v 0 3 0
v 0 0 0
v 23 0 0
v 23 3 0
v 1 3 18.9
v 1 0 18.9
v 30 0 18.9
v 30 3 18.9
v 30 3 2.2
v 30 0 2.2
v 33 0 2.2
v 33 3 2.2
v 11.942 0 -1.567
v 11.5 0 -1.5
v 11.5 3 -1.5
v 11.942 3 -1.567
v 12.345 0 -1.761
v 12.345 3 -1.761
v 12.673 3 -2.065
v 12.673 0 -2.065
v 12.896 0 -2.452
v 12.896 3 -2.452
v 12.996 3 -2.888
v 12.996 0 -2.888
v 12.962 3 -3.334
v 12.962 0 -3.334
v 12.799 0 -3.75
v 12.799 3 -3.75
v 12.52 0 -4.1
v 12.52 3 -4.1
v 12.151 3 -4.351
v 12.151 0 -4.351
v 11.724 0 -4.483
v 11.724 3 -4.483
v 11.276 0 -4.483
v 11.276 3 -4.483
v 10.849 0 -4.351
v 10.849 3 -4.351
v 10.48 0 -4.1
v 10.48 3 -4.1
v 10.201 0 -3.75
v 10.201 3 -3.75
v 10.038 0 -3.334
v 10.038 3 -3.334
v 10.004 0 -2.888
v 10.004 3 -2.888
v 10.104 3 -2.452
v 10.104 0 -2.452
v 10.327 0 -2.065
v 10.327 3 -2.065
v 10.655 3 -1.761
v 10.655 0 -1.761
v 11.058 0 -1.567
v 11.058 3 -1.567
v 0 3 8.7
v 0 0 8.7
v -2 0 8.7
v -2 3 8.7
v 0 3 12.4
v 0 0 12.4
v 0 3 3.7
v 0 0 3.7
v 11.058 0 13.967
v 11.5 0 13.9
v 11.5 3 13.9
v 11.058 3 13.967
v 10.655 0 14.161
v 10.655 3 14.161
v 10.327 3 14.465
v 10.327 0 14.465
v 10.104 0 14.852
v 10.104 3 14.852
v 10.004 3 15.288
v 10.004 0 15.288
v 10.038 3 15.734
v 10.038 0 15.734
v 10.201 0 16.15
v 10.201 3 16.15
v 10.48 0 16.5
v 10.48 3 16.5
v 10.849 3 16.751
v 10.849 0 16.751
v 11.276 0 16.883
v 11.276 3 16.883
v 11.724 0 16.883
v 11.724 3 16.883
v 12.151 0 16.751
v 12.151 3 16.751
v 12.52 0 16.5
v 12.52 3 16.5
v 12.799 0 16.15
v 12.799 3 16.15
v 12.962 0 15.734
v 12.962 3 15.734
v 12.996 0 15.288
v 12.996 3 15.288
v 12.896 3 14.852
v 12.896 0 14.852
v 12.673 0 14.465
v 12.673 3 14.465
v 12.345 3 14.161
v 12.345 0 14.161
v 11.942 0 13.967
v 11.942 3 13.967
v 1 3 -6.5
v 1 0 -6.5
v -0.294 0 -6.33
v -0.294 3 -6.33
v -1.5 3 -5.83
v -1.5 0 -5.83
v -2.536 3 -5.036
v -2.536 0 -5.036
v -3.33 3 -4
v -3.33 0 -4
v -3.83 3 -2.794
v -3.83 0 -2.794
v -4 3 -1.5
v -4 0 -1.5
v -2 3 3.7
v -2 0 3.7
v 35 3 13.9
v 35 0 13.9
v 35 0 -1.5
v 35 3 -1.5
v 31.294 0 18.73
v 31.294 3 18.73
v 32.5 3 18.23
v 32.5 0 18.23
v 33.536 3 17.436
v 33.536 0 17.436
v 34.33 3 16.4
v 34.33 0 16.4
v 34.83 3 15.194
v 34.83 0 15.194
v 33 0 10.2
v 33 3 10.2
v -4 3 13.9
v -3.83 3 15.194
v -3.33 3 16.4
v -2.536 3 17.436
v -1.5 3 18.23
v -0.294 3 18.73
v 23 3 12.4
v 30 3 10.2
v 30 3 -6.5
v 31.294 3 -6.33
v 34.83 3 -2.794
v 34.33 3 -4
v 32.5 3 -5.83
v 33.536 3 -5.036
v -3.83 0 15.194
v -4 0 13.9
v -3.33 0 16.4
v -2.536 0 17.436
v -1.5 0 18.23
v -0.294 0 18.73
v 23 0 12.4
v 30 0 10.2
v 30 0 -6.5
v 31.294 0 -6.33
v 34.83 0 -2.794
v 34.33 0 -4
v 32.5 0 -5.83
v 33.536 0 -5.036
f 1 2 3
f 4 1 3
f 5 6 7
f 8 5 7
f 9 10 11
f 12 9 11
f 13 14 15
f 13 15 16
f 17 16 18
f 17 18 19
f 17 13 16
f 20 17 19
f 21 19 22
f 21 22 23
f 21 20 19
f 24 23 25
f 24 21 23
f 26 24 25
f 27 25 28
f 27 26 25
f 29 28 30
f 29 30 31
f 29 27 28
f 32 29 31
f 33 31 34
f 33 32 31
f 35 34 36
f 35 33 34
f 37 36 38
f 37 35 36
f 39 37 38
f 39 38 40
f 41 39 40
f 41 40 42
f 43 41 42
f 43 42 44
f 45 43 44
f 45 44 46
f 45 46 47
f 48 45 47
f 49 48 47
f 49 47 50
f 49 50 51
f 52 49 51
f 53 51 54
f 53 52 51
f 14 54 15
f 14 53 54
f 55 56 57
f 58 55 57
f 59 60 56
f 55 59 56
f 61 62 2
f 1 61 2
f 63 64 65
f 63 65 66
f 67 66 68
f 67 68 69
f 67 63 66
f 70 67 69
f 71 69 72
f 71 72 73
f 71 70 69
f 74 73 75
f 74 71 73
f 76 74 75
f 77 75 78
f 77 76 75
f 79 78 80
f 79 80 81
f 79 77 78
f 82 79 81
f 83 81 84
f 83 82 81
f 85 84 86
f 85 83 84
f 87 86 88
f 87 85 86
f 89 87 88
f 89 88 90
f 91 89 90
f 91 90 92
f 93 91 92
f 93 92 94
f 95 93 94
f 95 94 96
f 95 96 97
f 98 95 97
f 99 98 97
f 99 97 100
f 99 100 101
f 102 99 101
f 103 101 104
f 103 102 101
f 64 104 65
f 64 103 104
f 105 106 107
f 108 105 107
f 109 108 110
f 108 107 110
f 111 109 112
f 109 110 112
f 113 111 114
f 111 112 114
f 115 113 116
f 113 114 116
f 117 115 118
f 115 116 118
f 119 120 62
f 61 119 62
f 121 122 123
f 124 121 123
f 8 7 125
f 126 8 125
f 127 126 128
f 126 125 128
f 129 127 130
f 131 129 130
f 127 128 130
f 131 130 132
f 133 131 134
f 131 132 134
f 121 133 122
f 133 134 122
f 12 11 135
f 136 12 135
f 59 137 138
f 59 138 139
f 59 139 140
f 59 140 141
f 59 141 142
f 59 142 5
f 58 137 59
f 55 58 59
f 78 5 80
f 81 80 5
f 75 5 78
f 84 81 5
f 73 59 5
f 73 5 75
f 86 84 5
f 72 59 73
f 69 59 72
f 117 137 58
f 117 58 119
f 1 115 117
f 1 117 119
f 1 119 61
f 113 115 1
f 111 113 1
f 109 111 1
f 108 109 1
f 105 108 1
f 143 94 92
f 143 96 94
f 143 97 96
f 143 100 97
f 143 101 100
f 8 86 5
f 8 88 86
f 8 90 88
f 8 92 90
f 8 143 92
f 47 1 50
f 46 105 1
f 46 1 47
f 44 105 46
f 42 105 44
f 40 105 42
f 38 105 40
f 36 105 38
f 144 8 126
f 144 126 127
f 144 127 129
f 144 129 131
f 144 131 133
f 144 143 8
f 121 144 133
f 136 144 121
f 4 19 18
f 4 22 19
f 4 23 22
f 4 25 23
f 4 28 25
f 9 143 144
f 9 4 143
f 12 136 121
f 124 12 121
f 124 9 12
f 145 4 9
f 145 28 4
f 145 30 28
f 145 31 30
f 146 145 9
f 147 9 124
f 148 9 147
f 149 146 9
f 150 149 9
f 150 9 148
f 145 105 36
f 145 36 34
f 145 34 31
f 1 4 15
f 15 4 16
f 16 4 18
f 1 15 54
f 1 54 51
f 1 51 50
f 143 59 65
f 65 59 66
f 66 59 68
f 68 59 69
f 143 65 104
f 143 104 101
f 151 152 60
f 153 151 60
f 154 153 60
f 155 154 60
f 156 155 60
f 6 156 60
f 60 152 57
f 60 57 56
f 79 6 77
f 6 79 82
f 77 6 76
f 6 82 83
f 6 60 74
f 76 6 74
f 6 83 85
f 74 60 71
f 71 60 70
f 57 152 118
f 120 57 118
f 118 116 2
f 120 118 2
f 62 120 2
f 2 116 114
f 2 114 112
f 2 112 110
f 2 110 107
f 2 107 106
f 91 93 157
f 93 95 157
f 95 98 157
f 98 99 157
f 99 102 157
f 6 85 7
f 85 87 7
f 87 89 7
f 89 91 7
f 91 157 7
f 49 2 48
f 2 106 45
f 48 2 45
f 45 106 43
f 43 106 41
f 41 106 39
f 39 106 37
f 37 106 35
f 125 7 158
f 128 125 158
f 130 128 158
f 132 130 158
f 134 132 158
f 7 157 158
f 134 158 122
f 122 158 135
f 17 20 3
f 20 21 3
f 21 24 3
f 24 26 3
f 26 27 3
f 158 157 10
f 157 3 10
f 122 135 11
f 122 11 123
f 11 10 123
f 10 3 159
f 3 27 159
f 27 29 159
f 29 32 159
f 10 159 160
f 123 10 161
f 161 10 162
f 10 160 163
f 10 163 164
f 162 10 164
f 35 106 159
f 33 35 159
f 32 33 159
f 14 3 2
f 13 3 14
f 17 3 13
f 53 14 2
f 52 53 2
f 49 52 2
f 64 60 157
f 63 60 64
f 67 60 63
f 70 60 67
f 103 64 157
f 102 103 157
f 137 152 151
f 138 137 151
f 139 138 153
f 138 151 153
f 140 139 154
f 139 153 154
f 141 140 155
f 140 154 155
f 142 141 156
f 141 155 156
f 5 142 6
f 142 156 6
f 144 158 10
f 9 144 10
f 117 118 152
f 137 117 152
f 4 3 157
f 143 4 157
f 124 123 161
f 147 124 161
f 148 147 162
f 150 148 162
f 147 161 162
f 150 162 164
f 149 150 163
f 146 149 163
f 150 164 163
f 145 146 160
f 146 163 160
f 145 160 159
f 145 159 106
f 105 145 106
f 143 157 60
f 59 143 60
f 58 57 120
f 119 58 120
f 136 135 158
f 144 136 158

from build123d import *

# Parameters (mm, degrees)
ESBO_O1_R                = 1.5
RESSALTO_EXTRUS_O1_DEPTH = 3


with BuildPart() as part:
    # Esboço1 → Ressalto-extrusão1 (new body)
    with BuildSketch(Plane(origin=(0, 0, 0), x_dir=(1, 0, 0), z_dir=(0, 1, 0))):
        with BuildLine():
            Line((11.5, 6.5), (1, 6.5))
            ThreePointArc((1, 6.5), (-2.535533906, 5.035533906), (-4, 1.5))
            Line((-4, 1.5), (-4, -13.9))
            ThreePointArc((-4, -13.9), (-2.535533906, -17.435533906), (1, -18.9))
            Line((1, -18.9), (30, -18.9))
            ThreePointArc((30, -18.9), (33.535533906, -17.435533906), (35, -13.9))
            Line((35, -13.9), (35, 1.5))
            ThreePointArc((35, 1.5), (33.535533906, 5.035533906), (30, 6.5))
            Line((30, 6.5), (11.5, 6.5))
        make_face()
        with Locations(Location((11.5, 3, 0), (0, 0, 270))):
            Circle(ESBO_O1_R, mode=Mode.SUBTRACT)
        with Locations(Location((11.5, -15.4, 0), (0, 0, 90))):
            Circle(ESBO_O1_R, mode=Mode.SUBTRACT)
        Polygon((0, 0), (23, 0), (23, -12.4), (0, -12.4), (0, -8.7), (-2, -8.7), (-2, -3.7), (0, -3.7), align=None, mode=Mode.SUBTRACT)
        Polygon((30, -6.2), (30, -2.2), (33, -2.2), (33, -10.2), (30, -10.2), align=None, mode=Mode.SUBTRACT)
    extrude(amount=RESSALTO_EXTRUS_O1_DEPTH)


solid = part.part
